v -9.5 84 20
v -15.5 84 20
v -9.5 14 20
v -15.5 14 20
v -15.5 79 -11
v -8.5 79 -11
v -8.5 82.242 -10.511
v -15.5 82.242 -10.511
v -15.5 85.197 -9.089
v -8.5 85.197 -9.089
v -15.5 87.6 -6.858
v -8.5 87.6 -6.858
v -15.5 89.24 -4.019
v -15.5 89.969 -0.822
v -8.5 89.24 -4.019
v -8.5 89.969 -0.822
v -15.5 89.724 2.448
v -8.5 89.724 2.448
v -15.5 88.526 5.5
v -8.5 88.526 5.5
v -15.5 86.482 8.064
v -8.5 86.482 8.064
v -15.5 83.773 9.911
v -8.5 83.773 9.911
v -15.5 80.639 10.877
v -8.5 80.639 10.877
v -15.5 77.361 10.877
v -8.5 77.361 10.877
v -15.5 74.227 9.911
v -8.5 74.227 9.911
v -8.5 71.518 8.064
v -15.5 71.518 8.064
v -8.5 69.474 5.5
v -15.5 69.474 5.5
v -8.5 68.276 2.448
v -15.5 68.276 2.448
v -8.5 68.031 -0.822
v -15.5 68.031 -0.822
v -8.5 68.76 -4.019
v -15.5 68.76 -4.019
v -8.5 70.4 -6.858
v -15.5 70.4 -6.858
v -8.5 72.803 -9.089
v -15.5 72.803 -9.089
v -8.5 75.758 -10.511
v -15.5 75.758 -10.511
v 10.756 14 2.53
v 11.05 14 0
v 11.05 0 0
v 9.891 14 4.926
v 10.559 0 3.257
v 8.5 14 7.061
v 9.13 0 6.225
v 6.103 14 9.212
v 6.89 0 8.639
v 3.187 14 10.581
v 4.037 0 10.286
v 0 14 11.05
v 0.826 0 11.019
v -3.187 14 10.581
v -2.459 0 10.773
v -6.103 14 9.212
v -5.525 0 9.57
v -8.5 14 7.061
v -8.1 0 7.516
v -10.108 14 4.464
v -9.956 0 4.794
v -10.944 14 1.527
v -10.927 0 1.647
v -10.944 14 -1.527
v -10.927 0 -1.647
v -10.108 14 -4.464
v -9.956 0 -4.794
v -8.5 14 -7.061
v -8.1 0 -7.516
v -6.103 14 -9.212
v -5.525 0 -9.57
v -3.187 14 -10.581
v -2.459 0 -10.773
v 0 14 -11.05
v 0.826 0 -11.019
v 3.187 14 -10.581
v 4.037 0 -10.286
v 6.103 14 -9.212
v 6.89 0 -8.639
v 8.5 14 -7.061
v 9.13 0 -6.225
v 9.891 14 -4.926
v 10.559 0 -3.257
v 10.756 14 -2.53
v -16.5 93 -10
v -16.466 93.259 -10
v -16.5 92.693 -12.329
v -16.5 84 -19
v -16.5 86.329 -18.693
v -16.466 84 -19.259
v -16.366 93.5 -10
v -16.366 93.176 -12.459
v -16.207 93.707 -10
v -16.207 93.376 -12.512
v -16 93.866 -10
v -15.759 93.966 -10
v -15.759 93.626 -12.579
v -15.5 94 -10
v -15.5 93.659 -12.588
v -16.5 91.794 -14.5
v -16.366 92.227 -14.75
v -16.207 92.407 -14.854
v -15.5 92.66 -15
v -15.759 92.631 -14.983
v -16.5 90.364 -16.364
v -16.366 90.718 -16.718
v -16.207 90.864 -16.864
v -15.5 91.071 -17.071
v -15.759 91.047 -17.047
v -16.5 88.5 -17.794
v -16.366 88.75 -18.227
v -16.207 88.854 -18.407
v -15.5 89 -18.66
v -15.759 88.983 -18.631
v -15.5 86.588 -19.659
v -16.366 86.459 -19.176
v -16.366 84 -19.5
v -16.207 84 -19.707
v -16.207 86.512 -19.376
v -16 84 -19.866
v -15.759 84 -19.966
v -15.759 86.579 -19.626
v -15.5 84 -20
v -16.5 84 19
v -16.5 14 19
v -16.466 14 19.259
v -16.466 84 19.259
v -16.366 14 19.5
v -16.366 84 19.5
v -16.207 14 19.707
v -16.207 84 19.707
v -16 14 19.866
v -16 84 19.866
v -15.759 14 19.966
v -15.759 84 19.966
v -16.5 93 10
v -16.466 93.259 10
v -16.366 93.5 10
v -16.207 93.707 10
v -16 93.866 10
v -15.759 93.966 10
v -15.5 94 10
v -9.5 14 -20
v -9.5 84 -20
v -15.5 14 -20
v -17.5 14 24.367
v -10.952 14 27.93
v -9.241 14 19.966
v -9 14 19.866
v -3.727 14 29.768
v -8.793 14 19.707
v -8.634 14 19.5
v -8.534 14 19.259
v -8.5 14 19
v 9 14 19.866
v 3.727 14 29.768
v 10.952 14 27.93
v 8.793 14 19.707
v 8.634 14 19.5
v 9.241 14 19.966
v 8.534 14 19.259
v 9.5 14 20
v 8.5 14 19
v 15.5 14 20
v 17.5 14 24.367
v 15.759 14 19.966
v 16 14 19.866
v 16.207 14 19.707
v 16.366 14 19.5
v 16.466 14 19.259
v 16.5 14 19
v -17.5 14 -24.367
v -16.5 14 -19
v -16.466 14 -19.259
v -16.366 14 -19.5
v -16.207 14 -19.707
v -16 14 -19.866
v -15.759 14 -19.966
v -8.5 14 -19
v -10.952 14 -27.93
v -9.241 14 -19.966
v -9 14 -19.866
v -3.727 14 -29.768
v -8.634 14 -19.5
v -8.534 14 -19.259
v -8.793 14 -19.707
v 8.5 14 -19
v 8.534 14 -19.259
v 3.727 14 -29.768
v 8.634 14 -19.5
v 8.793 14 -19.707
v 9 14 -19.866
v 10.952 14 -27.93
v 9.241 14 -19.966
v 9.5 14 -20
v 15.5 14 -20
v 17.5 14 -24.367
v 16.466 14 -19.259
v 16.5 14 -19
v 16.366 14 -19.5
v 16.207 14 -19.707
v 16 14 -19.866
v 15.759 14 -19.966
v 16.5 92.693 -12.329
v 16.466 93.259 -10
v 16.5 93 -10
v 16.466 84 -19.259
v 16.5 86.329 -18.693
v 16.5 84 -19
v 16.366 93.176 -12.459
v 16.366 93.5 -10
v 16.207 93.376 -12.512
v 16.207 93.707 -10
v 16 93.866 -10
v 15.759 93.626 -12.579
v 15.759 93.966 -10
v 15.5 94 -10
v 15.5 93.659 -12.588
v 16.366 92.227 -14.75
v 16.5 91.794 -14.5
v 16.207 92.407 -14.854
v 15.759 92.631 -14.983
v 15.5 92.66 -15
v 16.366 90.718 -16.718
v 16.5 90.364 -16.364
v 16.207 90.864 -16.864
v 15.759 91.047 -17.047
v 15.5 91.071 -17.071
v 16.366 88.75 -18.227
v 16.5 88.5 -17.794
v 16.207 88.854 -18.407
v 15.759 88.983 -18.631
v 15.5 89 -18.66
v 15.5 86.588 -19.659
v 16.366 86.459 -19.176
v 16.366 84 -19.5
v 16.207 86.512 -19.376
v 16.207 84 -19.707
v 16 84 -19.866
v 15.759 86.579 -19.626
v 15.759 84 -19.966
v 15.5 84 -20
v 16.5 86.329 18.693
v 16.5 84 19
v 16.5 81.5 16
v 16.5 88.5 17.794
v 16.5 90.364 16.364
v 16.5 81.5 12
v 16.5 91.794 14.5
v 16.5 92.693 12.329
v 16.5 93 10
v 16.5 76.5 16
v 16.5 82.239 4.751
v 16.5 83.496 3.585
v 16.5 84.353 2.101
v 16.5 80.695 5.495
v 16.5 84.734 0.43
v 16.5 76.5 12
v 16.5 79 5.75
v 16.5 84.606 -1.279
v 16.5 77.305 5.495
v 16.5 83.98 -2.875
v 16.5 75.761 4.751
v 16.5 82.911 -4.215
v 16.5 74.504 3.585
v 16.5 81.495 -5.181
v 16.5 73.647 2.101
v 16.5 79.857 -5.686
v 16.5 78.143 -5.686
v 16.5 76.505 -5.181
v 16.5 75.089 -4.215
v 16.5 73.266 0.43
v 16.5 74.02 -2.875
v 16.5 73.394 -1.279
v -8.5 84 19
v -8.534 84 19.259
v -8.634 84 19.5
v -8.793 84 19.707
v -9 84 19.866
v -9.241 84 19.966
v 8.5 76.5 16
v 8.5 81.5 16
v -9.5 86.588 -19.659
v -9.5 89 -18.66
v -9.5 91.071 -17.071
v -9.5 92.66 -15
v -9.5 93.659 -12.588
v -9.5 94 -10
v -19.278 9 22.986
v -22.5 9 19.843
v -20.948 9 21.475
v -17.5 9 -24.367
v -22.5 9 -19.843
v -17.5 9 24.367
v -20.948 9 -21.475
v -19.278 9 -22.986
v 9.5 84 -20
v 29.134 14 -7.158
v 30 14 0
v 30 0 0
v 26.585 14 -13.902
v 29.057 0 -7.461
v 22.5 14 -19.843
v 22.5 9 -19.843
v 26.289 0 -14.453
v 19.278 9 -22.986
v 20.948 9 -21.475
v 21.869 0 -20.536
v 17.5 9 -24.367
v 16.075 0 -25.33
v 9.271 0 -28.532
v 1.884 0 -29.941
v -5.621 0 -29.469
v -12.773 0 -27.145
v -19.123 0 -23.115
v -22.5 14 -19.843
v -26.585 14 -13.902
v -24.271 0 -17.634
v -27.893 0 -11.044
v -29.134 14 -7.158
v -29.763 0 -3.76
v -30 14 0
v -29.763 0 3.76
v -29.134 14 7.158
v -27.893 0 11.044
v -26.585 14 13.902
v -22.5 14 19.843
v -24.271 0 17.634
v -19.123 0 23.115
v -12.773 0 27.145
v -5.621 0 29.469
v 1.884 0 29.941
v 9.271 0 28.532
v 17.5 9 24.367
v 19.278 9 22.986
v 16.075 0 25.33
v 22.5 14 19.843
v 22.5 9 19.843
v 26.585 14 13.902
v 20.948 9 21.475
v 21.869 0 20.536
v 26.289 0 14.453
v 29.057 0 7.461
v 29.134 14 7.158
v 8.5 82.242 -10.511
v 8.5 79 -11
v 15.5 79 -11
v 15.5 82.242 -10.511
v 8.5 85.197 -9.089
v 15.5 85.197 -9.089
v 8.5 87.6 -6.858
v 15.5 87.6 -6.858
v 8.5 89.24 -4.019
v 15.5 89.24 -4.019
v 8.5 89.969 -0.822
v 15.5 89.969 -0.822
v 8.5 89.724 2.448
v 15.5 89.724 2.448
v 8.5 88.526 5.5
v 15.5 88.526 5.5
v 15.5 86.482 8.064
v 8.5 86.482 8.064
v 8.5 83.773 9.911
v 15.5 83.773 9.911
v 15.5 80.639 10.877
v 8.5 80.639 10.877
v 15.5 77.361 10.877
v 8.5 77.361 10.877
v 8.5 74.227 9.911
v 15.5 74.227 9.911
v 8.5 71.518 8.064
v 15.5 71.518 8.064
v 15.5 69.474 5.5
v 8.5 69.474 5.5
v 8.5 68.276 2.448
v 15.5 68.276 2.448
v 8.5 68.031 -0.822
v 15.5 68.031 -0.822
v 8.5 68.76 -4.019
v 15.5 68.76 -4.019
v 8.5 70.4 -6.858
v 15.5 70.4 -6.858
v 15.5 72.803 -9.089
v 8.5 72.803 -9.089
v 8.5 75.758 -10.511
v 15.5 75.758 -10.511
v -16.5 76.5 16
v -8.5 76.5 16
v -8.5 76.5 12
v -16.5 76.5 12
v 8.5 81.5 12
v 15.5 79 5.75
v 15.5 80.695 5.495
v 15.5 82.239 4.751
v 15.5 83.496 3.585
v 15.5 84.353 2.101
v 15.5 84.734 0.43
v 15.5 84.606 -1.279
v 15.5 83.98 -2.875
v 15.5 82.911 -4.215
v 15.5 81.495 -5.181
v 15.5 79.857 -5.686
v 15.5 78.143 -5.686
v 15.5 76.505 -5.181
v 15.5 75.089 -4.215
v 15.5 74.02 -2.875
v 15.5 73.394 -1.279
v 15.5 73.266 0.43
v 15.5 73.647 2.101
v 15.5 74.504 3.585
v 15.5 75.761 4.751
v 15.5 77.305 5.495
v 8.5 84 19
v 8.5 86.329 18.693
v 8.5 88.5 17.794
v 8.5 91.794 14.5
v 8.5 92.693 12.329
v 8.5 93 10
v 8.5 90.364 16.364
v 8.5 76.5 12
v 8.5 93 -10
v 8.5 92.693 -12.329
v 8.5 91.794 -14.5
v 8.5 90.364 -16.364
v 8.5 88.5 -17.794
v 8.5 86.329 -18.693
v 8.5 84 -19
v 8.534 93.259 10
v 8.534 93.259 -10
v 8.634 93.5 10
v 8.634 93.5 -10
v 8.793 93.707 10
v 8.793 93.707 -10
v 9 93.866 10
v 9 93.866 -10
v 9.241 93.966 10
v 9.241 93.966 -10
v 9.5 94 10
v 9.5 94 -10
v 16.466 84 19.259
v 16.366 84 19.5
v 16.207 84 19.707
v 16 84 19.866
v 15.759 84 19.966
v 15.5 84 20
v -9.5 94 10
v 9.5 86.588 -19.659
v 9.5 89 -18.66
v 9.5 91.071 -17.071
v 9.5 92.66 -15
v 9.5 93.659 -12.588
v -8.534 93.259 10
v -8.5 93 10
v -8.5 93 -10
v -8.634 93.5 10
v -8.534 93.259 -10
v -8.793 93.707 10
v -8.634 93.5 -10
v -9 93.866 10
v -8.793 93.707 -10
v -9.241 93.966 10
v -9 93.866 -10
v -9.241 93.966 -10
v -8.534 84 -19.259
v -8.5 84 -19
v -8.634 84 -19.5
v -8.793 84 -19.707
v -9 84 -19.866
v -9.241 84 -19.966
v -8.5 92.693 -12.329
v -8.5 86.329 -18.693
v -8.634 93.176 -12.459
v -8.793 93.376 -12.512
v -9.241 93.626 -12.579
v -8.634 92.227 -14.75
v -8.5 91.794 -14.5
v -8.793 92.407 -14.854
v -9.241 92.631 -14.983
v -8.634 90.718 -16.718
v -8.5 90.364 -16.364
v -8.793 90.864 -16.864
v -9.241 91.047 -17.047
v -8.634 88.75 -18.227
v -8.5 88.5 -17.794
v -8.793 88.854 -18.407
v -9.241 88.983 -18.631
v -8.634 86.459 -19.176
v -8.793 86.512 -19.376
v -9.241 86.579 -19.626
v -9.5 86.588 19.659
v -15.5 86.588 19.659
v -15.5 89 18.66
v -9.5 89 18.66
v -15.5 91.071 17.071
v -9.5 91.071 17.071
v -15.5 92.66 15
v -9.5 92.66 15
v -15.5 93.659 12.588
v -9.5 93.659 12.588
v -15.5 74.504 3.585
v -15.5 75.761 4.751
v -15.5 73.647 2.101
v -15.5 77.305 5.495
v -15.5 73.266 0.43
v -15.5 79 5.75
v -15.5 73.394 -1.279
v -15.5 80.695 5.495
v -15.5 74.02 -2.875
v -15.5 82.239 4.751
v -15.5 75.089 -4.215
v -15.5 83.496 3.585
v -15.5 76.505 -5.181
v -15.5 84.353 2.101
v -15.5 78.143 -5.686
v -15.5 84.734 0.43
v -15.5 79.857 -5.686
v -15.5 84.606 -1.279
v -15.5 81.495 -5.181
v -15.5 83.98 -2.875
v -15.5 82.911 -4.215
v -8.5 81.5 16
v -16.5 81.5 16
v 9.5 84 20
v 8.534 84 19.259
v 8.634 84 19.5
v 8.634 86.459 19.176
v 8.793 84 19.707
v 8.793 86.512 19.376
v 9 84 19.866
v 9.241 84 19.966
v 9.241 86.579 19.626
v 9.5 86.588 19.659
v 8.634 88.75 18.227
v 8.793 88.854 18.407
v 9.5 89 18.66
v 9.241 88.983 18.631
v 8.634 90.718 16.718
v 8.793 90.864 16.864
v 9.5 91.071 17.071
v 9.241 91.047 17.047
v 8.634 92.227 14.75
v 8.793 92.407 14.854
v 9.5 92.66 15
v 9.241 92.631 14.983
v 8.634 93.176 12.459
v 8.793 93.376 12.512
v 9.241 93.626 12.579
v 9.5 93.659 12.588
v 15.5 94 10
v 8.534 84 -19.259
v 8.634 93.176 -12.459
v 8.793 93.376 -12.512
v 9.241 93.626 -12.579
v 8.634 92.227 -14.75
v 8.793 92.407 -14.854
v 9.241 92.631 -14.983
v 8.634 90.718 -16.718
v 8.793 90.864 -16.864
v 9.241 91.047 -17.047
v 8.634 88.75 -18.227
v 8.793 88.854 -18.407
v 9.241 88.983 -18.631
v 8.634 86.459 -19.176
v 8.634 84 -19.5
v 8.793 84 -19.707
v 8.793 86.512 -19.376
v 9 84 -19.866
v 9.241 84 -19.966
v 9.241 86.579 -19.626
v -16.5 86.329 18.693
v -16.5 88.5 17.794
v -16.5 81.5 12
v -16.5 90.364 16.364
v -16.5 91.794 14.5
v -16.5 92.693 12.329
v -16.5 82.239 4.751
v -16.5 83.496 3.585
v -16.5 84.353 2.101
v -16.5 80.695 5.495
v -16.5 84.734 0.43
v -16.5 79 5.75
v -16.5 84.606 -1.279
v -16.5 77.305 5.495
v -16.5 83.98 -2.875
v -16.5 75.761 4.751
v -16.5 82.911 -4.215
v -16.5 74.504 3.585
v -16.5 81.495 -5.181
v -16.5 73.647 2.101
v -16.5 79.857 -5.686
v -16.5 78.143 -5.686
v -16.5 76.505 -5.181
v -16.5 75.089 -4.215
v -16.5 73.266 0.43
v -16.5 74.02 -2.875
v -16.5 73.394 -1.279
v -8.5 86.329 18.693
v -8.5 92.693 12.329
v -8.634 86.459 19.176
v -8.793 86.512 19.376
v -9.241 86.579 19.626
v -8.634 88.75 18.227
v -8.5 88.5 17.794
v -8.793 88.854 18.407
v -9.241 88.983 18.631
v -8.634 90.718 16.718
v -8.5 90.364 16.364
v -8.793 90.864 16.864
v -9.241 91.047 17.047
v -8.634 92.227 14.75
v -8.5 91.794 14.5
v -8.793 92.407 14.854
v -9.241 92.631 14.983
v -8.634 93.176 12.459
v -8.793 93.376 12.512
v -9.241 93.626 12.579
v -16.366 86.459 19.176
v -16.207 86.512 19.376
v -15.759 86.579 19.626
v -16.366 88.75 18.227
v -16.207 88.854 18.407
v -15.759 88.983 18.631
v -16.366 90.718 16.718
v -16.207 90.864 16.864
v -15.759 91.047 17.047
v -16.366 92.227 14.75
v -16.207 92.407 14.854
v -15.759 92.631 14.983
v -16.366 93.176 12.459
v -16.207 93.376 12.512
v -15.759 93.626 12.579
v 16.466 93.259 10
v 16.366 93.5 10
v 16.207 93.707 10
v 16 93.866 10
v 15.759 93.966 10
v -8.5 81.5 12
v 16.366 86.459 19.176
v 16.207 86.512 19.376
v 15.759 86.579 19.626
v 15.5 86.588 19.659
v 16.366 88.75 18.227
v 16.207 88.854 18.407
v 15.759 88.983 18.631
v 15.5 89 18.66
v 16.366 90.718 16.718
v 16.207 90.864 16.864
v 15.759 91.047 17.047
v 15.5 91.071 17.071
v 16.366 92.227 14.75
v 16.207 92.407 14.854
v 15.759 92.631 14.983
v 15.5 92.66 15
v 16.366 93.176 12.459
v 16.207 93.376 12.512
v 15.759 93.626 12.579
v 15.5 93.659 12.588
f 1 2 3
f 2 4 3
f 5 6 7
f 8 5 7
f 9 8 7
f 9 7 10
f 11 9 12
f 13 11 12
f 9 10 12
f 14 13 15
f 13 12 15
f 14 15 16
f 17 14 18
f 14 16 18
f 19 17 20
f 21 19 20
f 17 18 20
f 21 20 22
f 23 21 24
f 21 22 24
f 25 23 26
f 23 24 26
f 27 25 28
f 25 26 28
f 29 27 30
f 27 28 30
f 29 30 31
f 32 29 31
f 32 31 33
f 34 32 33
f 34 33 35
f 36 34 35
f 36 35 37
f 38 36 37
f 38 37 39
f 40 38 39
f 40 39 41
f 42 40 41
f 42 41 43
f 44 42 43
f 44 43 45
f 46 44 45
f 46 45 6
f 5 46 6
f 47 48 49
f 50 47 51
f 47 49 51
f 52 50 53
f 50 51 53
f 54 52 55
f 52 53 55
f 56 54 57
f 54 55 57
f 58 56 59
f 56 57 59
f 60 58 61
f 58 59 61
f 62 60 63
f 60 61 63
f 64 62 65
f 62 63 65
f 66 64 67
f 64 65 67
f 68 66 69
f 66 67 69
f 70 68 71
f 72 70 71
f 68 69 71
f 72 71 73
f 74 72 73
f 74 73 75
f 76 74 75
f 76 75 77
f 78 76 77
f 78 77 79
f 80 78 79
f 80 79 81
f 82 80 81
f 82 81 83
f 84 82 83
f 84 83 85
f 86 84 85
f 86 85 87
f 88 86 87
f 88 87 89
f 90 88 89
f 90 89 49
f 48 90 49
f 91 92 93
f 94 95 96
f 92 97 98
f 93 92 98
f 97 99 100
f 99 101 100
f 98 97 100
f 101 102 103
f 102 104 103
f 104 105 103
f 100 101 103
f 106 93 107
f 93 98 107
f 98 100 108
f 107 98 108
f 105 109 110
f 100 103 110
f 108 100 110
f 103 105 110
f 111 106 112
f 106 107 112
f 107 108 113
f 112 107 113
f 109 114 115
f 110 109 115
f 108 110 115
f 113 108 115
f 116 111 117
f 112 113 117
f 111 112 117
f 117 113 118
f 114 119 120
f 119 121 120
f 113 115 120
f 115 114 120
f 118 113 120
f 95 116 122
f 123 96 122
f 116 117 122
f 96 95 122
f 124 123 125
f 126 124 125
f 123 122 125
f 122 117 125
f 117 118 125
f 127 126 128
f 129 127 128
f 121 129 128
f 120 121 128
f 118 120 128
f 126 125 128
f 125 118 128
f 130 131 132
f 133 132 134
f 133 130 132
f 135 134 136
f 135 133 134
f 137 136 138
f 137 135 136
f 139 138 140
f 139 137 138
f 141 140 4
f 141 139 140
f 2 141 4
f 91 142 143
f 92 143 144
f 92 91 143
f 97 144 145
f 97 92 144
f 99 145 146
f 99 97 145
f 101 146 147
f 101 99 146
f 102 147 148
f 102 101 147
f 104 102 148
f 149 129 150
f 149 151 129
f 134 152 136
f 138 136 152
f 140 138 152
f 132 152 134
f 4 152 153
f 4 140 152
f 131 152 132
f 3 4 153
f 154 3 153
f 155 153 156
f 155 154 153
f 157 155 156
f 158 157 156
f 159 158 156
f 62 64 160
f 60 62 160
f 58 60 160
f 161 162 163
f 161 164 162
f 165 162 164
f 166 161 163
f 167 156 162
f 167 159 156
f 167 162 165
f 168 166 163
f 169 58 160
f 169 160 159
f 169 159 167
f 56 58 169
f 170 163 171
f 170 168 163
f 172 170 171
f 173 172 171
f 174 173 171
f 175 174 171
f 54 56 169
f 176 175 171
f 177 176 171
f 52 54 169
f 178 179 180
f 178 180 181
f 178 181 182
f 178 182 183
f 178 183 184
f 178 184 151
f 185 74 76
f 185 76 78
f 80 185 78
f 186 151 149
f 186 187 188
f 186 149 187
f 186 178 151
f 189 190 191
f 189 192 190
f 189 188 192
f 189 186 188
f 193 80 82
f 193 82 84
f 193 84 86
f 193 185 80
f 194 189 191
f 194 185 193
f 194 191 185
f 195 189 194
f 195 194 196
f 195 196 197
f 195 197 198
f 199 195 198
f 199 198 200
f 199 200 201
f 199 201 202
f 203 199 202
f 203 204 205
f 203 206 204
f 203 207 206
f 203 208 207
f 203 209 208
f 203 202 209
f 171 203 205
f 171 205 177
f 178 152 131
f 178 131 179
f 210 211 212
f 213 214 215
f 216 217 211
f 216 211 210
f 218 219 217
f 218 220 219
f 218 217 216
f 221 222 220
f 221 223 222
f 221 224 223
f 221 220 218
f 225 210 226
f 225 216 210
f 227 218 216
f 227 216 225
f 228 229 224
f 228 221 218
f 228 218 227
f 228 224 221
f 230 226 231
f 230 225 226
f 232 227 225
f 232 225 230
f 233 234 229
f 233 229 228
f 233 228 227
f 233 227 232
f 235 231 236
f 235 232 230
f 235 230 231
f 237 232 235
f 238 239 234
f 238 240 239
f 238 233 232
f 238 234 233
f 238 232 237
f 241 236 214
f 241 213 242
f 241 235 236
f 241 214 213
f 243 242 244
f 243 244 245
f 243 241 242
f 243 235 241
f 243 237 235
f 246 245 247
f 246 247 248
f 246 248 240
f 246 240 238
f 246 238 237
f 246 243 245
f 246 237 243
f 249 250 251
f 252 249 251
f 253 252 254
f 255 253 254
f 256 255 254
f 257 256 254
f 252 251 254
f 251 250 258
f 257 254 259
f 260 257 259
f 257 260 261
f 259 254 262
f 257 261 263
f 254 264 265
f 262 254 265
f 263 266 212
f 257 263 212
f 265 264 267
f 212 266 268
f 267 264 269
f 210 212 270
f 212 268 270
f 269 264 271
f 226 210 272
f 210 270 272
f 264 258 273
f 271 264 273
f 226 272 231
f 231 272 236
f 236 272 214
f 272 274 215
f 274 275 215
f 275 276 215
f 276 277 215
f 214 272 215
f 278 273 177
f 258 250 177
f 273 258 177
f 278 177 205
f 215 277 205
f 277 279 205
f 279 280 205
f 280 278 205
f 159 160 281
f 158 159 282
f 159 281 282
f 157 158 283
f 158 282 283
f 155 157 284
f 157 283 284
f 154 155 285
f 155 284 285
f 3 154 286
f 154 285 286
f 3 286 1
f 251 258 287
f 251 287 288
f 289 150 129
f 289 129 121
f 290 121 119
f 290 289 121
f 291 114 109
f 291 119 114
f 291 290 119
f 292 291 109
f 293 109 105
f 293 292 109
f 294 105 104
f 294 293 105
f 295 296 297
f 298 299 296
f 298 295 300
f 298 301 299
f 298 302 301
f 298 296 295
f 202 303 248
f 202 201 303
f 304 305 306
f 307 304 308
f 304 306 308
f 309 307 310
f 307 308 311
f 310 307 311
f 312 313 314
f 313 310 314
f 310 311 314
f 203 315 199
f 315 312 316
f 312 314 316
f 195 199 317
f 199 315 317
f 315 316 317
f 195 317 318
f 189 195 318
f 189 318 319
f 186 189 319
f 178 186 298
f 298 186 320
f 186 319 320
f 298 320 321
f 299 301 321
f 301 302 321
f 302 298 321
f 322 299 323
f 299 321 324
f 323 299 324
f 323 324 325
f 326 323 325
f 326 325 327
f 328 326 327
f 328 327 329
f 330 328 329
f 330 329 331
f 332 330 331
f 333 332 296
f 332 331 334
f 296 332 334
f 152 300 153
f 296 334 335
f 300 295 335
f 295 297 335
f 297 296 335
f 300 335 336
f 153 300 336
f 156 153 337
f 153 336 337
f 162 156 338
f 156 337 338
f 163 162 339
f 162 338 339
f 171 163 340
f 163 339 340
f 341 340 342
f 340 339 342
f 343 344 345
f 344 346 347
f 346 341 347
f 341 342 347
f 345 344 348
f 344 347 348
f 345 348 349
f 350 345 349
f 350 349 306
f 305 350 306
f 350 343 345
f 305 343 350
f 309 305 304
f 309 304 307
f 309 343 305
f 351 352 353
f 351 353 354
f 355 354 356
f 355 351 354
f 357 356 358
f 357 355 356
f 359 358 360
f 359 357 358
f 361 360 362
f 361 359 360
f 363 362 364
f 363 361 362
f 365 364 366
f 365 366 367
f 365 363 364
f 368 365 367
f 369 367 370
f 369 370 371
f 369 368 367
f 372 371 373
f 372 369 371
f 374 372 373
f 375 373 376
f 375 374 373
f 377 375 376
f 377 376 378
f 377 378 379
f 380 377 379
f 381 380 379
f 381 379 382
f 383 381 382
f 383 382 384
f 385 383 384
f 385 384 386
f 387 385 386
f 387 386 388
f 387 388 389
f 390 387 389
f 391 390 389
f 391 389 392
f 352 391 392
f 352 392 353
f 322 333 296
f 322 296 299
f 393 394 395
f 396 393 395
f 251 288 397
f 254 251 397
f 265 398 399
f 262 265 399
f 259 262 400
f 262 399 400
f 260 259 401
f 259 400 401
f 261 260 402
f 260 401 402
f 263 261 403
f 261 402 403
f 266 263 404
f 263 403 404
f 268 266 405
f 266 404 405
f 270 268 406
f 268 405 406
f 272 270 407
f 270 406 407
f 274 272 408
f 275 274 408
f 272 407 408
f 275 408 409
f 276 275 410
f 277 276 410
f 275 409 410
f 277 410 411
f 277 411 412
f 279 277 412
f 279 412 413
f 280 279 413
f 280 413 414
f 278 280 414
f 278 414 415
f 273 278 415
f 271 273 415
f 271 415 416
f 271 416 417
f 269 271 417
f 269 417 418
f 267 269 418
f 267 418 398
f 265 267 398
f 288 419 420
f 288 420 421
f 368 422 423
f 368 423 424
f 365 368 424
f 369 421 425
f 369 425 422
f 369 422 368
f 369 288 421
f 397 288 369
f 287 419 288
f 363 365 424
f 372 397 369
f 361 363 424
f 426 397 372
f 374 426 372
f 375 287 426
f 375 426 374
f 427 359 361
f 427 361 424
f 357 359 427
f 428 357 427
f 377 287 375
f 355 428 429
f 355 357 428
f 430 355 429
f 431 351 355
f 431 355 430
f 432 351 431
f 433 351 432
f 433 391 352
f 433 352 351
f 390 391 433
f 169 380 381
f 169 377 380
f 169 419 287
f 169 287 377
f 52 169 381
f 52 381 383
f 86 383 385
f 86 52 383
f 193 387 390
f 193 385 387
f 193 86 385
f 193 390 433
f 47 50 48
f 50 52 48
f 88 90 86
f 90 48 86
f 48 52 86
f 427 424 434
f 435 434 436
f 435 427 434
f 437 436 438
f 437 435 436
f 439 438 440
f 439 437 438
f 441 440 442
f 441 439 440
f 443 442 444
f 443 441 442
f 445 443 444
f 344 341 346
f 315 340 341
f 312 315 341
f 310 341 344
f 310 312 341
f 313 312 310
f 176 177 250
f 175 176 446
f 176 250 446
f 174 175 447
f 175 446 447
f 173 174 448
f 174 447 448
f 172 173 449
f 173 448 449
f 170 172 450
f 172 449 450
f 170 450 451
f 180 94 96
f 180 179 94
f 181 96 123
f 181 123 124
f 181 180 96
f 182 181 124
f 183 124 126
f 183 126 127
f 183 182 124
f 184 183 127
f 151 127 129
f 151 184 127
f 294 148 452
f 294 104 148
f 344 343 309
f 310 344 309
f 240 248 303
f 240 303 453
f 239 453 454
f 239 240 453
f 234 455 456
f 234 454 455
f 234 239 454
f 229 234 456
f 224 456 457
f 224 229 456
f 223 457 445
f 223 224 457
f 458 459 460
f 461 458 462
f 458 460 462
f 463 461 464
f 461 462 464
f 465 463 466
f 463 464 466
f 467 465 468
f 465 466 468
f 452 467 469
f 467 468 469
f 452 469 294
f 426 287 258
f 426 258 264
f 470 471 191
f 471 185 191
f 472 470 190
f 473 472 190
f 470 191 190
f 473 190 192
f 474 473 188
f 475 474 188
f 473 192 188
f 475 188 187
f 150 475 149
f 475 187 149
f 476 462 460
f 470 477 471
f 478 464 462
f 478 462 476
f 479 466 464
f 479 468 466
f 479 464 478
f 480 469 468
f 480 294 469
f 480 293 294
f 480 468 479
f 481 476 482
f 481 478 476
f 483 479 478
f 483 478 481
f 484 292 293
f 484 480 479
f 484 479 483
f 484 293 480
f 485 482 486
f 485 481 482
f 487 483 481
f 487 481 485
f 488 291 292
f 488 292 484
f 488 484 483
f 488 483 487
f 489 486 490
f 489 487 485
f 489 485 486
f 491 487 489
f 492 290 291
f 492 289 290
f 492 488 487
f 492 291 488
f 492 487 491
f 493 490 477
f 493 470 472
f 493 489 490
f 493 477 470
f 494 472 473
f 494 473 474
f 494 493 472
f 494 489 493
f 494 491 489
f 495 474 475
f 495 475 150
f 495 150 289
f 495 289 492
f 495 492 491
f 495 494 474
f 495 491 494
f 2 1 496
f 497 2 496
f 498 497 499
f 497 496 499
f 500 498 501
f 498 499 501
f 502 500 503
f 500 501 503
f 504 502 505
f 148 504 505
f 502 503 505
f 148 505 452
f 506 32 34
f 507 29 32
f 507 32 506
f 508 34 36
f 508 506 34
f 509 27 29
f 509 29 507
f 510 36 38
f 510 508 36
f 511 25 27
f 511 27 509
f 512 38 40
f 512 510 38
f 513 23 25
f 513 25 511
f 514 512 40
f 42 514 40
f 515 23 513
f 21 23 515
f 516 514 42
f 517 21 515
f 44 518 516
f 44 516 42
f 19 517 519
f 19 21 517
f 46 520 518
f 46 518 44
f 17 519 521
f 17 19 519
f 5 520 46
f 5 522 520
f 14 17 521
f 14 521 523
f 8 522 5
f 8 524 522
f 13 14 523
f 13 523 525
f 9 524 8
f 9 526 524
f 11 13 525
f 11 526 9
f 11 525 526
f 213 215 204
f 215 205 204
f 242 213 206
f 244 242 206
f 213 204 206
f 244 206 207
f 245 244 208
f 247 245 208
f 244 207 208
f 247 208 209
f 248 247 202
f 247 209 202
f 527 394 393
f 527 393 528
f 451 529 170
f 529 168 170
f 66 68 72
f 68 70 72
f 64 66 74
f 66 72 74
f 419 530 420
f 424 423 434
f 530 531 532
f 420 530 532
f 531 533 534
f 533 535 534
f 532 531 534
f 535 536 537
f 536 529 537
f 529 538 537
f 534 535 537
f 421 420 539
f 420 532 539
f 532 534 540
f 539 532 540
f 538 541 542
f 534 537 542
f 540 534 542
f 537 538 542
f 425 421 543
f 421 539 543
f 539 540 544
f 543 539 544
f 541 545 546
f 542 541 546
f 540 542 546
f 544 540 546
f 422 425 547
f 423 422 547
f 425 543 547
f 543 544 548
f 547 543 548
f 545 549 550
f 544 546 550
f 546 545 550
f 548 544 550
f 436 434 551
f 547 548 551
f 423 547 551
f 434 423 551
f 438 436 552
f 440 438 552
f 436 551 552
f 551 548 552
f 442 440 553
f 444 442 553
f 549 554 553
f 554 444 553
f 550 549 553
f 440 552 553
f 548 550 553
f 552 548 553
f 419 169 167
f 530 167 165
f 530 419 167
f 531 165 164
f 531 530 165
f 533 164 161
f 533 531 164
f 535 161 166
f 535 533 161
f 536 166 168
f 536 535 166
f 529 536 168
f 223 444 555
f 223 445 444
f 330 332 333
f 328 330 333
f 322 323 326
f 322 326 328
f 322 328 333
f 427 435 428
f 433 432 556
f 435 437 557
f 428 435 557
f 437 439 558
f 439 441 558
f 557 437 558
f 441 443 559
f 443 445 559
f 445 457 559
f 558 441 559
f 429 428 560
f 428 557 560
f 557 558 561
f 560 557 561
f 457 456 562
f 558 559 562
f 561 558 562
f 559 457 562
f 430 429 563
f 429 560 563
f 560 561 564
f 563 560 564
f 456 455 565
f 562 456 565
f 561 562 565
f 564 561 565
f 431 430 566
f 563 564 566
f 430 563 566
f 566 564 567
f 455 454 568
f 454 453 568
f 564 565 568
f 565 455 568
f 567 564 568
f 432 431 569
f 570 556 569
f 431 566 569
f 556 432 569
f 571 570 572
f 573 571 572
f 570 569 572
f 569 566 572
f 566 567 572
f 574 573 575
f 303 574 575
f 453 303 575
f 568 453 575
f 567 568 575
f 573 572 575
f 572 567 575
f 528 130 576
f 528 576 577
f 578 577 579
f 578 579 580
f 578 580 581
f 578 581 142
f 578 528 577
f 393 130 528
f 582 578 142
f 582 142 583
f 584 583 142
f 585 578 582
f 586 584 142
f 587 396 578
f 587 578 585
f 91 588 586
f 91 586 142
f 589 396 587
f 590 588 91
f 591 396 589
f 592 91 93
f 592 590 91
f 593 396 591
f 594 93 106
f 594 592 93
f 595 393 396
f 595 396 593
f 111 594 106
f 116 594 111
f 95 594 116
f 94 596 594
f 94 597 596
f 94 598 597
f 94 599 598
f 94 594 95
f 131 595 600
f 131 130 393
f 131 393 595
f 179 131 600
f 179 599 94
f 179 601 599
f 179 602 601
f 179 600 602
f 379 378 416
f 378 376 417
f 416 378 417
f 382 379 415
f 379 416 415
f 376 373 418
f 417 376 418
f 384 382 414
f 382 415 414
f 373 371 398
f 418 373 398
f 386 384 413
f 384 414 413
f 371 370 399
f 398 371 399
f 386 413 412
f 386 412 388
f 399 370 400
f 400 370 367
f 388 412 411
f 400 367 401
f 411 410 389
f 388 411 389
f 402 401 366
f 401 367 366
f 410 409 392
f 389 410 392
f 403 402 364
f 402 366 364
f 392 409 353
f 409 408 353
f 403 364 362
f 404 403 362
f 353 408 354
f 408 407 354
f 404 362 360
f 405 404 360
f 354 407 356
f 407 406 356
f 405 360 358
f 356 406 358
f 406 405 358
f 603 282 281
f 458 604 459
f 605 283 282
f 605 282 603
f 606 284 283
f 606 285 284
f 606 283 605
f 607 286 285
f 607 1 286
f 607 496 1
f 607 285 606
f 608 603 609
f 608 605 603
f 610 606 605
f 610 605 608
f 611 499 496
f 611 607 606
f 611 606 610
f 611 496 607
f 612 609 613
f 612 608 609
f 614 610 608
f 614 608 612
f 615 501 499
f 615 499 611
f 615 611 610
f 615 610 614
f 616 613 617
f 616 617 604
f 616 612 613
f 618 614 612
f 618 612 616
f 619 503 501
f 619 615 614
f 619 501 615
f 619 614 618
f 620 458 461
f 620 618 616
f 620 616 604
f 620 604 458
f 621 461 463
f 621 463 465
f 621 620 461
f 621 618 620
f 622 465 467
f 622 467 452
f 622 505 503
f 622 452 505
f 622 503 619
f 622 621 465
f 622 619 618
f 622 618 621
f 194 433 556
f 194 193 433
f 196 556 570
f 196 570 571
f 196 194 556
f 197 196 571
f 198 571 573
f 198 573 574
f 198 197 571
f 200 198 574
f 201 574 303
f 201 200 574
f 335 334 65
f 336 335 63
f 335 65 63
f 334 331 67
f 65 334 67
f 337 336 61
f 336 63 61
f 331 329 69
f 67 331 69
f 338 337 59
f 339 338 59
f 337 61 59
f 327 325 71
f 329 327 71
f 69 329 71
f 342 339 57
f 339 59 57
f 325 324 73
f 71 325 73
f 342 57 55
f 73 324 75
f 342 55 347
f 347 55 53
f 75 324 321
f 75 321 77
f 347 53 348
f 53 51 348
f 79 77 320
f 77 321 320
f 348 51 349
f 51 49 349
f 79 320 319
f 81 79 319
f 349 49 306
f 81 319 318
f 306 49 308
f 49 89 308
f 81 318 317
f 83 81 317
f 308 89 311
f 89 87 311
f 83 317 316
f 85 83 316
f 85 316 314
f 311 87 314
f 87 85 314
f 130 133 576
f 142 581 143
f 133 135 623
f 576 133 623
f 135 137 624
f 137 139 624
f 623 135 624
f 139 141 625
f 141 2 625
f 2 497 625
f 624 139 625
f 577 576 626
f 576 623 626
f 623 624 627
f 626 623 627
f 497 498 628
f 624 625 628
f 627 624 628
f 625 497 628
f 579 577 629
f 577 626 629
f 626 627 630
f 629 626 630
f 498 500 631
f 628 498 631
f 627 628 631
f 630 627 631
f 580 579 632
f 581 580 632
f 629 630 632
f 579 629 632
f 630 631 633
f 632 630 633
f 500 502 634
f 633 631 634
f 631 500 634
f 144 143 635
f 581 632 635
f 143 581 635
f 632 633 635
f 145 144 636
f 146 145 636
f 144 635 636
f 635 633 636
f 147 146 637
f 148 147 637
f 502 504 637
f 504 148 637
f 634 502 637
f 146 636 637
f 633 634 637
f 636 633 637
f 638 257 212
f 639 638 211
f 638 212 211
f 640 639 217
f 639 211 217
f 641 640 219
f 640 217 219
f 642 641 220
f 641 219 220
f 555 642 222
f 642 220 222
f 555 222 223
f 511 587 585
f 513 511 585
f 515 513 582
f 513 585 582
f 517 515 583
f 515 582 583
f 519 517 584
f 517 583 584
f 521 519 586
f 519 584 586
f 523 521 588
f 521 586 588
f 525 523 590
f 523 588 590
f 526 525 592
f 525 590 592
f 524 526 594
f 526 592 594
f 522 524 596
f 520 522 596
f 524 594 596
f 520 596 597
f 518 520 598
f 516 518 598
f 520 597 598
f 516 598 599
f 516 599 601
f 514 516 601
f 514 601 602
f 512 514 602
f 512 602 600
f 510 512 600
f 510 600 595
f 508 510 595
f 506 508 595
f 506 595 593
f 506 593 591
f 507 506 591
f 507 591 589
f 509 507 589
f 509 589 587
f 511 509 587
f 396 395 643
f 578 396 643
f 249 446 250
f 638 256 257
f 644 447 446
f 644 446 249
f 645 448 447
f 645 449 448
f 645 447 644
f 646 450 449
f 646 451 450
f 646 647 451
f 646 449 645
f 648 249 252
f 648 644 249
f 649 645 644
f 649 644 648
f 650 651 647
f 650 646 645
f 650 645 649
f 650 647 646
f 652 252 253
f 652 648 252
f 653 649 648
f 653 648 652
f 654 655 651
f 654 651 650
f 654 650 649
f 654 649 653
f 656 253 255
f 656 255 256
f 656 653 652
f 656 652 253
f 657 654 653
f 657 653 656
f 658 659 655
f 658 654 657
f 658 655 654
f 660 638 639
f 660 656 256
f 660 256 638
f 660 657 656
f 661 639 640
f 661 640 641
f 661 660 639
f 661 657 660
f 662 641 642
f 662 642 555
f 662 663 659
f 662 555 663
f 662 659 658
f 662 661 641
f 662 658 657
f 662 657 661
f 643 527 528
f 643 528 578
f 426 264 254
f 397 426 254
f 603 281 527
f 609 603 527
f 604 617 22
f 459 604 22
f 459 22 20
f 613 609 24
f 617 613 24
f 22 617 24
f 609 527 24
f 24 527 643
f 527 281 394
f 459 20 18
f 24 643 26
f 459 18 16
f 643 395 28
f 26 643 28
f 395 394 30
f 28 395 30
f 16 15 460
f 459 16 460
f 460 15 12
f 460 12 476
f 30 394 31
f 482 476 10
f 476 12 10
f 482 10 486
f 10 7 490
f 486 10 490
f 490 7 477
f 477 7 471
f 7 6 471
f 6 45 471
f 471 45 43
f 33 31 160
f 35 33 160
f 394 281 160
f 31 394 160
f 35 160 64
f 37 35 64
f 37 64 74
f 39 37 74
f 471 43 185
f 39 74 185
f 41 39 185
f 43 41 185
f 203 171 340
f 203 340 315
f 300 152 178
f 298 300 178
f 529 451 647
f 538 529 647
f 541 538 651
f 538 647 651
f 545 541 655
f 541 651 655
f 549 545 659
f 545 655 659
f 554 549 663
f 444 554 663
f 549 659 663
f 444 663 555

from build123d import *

# Parameters (mm, degrees)
SKETCH1_R               = 30
BOSS_EXTRUDE1_DEPTH     = 14
SKETCH2_R               = 11.05
CUT_EXTRUDE1_DEPTH      = 15
SKETCH5_W               = 8
SKETCH5_H               = 40
BOSS_EXTRUDE2_DEPTH     = 80
FILLET1_R               = 10
SKETCH12_R              = 11
CUT_EXTRUDE5_DEPTH      = 15.5
CUT_EXTRUDE5_DEPTH_BACK = 15.5
SKETCH13_R              = 5.75
CUT_EXTRUDE6_DEPTH      = 33
SKETCH14_W              = 5
SKETCH14_H              = 60.1
CUT_EXTRUDE7_DEPTH      = 5
FILLET2_R               = 1
FILLET3_R               = 1
SKETCH15_W              = 4
SKETCH15_H              = 5
CUT_EXTRUDE14_DEPTH     = 33


with BuildPart() as part:
    # Sketch1 → Boss-Extrude1 (new body)
    with BuildSketch(Plane(origin=(0, 0, 0), x_dir=(1, 0, 0), z_dir=(0, 1, 0))):
        Circle(SKETCH1_R)
    extrude(amount=BOSS_EXTRUDE1_DEPTH)

    # Sketch2 → Cut-Extrude1 (cut, through all)
    with BuildSketch(Plane.XZ):
        Circle(SKETCH2_R)
    extrude(amount=-CUT_EXTRUDE1_DEPTH, mode=Mode.SUBTRACT)

    # Sketch5 → Boss-Extrude2 (add)
    with BuildSketch(Plane(origin=(0, 14, 0), x_dir=(1, 0, 0), z_dir=(0, 1, 0))):
        with Locations((-12.5, 0)):
            Rectangle(SKETCH5_W, SKETCH5_H)
        with Locations((12.5, 0)):
            Rectangle(SKETCH5_W, SKETCH5_H)
    extrude(amount=BOSS_EXTRUDE2_DEPTH)

    # Fillet1
    fillet1_edges = [part.edges().sort_by_distance(p)[0] for p in [
        (-12.5, 94, 20),
        (-12.5, 94, -20),
        (12.5, 94, 20),
        (12.5, 94, -20),
    ]]
    fillet(fillet1_edges, radius=FILLET1_R)

    # Sketch12 → Cut-Extrude5 (cut, two sides)
    with BuildSketch(Plane(origin=(0, 0, 0), x_dir=(0, 0, -1), z_dir=(1, 0, 0))) as cut_extrude5_sk:
        with Locations((0, 79)):
            Circle(SKETCH12_R)
    extrude(amount=CUT_EXTRUDE5_DEPTH, mode=Mode.SUBTRACT)
    extrude(cut_extrude5_sk.sketch, amount=-CUT_EXTRUDE5_DEPTH_BACK, mode=Mode.SUBTRACT)

    # Sketch13 → Cut-Extrude6 (cut)
    with BuildSketch(Plane.ZY.offset(16.5)):
        with Locations((0, 79)):
            Circle(SKETCH13_R)
    extrude(amount=-CUT_EXTRUDE6_DEPTH, mode=Mode.SUBTRACT)

    # Sketch14 → Cut-Extrude7 (cut)
    with BuildSketch(Plane(origin=(0, 14, 0), x_dir=(1, 0, 0), z_dir=(0, 1, 0))):
        with Locations((-20, 0)):
            Rectangle(SKETCH14_W, SKETCH14_H)
        with Locations((20, 0)):
            Rectangle(SKETCH14_W, SKETCH14_H)
    extrude(amount=-CUT_EXTRUDE7_DEPTH, mode=Mode.SUBTRACT)

    # Fillet2
    fillet2_edges = [part.edges().sort_by_distance(p)[0] for p in [
        (-16.5, 94, 0),
        (-16.5, 49, 20),
        (-16.5, 49, -20),
        (-16.5, 91.071067812, 17.071067812),
        (-16.5, 91.071067812, -17.071067812),
        (16.5, 94, 0),
        (16.5, 49, -20),
        (16.5, 49, 20),
        (16.5, 91.071067812, 17.071067812),
        (16.5, 91.071067812, -17.071067812),
    ]]
    fillet(fillet2_edges, radius=FILLET2_R)

    # Fillet3
    fillet3_edges = [part.edges().sort_by_distance(p)[0] for p in [
        (-8.5, 94, 0),
        (-8.5, 49, -20),
        (-8.5, 49, 20),
        (-8.5, 91.071067812, 17.071067812),
        (-8.5, 91.071067812, -17.071067812),
        (8.5, 94, 0),
        (8.5, 49, 20),
        (8.5, 49, -20),
        (8.5, 91.071067812, 17.071067812),
        (8.5, 91.071067812, -17.071067812),
    ]]
    fillet(fillet3_edges, radius=FILLET3_R)

    # Sketch15 → Cut-Extrude14 (cut)
    with BuildSketch(Plane(origin=(16.5, 0, 0), x_dir=(0, 0, -1), z_dir=(1, 0, 0))):
        with Locations((-14, 79)):
            Rectangle(SKETCH15_W, SKETCH15_H)
    extrude(amount=-CUT_EXTRUDE14_DEPTH, mode=Mode.SUBTRACT)


solid = part.part
